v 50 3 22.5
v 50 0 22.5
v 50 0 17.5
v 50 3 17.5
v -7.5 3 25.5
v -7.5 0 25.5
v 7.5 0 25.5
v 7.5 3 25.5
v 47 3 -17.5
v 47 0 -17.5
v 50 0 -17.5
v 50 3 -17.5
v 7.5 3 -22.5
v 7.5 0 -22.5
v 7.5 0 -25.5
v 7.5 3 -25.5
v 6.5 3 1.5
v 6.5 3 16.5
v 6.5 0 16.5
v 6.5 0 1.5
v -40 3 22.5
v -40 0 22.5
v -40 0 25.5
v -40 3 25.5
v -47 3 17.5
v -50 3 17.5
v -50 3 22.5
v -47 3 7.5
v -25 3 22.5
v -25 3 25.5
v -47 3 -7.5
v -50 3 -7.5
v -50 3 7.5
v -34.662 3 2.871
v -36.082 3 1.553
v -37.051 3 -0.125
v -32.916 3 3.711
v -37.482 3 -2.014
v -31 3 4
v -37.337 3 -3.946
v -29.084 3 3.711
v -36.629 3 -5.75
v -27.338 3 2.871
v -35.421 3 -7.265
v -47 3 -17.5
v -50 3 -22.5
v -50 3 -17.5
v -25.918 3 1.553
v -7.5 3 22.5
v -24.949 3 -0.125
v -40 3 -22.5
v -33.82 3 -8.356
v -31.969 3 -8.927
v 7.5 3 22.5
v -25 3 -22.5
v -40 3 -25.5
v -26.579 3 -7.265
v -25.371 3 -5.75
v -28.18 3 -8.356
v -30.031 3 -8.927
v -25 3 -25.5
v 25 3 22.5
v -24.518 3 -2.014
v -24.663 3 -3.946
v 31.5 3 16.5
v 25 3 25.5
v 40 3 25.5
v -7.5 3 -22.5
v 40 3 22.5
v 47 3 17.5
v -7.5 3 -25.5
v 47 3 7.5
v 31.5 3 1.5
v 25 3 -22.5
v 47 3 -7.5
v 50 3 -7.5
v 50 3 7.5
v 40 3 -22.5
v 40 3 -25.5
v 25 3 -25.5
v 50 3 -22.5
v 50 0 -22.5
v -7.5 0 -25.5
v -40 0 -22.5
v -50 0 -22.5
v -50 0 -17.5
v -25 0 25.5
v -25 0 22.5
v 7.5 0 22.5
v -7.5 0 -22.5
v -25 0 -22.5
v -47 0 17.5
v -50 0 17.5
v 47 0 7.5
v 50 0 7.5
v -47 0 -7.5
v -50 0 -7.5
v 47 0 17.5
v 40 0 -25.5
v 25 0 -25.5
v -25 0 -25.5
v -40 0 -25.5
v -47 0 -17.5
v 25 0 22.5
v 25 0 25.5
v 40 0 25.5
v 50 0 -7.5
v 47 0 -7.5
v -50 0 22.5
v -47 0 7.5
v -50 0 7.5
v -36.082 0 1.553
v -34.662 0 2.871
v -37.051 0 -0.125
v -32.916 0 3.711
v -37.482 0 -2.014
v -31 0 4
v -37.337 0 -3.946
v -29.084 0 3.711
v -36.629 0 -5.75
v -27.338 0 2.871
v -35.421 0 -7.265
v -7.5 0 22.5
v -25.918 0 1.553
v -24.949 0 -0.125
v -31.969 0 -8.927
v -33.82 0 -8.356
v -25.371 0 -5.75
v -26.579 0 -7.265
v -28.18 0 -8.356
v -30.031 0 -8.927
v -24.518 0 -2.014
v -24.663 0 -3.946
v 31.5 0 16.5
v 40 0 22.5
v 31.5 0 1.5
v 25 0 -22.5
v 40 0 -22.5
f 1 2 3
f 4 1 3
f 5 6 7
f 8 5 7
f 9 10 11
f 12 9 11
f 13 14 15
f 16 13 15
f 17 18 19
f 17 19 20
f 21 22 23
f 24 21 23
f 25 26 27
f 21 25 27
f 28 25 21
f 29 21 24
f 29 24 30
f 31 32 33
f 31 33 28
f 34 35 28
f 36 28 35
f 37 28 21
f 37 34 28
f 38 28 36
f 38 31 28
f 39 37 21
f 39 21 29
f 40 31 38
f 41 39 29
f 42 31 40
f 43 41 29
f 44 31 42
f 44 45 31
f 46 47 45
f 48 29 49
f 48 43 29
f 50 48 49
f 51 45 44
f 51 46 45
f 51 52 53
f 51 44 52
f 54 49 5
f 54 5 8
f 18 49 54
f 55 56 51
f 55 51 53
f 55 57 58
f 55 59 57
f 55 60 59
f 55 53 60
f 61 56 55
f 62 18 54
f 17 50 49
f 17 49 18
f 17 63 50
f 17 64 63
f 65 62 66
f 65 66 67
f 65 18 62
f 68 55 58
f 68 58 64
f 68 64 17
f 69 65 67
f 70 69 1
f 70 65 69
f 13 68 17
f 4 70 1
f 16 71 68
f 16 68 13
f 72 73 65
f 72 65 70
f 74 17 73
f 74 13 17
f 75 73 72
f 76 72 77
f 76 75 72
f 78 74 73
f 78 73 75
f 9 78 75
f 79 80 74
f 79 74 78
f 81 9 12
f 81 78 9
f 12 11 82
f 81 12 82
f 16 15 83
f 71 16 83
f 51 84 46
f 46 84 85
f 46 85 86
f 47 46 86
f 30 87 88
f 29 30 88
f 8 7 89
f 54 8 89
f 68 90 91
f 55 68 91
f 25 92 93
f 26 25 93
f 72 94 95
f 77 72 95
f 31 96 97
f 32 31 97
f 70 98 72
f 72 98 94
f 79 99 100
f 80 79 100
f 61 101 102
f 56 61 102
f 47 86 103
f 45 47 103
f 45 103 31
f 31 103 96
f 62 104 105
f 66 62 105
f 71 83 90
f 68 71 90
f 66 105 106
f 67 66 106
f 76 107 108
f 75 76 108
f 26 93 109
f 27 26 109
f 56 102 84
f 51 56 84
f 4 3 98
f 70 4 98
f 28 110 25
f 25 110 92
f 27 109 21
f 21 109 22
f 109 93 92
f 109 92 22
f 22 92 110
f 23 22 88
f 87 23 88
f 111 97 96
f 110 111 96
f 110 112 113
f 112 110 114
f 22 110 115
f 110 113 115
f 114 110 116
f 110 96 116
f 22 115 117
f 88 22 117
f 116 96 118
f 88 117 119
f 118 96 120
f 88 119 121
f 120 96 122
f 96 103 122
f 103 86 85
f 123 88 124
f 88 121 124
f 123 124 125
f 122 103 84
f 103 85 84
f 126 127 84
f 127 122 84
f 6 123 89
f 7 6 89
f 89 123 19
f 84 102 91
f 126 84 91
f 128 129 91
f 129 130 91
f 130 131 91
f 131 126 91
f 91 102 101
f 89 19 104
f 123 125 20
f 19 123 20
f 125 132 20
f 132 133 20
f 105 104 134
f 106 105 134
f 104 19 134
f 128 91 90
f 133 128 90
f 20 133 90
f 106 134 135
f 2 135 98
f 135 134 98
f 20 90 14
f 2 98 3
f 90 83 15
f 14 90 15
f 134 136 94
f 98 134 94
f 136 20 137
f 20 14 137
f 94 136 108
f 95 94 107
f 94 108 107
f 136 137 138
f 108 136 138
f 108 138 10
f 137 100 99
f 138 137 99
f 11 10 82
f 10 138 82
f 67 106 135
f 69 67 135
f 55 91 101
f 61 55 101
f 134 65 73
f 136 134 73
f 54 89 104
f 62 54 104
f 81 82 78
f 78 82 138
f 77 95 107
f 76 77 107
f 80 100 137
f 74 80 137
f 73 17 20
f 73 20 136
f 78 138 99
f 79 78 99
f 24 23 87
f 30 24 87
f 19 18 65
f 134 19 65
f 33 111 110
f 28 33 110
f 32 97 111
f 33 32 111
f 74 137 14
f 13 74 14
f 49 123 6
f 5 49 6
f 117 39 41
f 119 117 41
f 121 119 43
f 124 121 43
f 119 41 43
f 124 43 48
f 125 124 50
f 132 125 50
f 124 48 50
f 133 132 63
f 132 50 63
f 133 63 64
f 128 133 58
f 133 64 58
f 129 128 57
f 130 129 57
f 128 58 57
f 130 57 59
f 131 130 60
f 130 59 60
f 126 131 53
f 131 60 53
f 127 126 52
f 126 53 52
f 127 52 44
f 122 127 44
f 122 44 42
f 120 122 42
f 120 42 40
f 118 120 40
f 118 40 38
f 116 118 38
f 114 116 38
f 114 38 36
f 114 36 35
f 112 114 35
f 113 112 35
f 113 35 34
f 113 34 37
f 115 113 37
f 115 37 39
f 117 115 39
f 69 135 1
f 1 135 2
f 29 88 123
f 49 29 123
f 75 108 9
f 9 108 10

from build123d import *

# Parameters (mm, degrees)
EXTRUDE_1_DEPTH     = 3
SKETCH_2_R          = 6.5
SKETCH_2_W          = 25
SKETCH_2_H          = 15
CUT_EXTRUDE_1_DEPTH = 57.207205944


with BuildPart() as part:
    # 草图1 → 凸台-拉伸1 (new body)
    with BuildSketch(Plane(origin=(0, 0, 0), x_dir=(1, 0, 0), z_dir=(0, 1, 0))):
        Polygon((-50, -22.5), (-40, -22.5), (-40, -25.5), (-25, -25.5), (-25, -22.5), (-7.5, -22.5), (-7.5, -25.5), (7.5, -25.5), (7.5, -22.5), (25, -22.5), (25, -25.5), (40, -25.5), (40, -22.5), (50, -22.5), (50, -17.5), (47, -17.5), (47, -7.5), (50, -7.5), (50, 7.5), (47, 7.5), (47, 17.5), (50, 17.5), (50, 22.5), (40, 22.5), (40, 25.5), (25, 25.5), (25, 22.5), (7.5, 22.5), (7.5, 25.5), (-7.5, 25.5), (-7.5, 22.5), (-25, 22.5), (-25, 25.5), (-40, 25.5), (-40, 22.5), (-50, 22.5), (-50, 17.5), (-47, 17.5), (-47, 7.5), (-50, 7.5), (-50, -7.5), (-47, -7.5), (-47, -17.5), (-50, -17.5), align=None)
    extrude(amount=EXTRUDE_1_DEPTH)

    # 草图2 → 切除-拉伸1 (cut, through all)
    with BuildSketch(Plane(origin=(0, 3, 0), x_dir=(1, 0, 0), z_dir=(0, 1, 0))):
        with Locations(Location((-31, 2.5, 0), (0, 0, 270))):
            Circle(SKETCH_2_R)
        with Locations((19, -9)):
            Rectangle(SKETCH_2_W, SKETCH_2_H)
    extrude(amount=-CUT_EXTRUDE_1_DEPTH, mode=Mode.SUBTRACT)


solid = part.part
